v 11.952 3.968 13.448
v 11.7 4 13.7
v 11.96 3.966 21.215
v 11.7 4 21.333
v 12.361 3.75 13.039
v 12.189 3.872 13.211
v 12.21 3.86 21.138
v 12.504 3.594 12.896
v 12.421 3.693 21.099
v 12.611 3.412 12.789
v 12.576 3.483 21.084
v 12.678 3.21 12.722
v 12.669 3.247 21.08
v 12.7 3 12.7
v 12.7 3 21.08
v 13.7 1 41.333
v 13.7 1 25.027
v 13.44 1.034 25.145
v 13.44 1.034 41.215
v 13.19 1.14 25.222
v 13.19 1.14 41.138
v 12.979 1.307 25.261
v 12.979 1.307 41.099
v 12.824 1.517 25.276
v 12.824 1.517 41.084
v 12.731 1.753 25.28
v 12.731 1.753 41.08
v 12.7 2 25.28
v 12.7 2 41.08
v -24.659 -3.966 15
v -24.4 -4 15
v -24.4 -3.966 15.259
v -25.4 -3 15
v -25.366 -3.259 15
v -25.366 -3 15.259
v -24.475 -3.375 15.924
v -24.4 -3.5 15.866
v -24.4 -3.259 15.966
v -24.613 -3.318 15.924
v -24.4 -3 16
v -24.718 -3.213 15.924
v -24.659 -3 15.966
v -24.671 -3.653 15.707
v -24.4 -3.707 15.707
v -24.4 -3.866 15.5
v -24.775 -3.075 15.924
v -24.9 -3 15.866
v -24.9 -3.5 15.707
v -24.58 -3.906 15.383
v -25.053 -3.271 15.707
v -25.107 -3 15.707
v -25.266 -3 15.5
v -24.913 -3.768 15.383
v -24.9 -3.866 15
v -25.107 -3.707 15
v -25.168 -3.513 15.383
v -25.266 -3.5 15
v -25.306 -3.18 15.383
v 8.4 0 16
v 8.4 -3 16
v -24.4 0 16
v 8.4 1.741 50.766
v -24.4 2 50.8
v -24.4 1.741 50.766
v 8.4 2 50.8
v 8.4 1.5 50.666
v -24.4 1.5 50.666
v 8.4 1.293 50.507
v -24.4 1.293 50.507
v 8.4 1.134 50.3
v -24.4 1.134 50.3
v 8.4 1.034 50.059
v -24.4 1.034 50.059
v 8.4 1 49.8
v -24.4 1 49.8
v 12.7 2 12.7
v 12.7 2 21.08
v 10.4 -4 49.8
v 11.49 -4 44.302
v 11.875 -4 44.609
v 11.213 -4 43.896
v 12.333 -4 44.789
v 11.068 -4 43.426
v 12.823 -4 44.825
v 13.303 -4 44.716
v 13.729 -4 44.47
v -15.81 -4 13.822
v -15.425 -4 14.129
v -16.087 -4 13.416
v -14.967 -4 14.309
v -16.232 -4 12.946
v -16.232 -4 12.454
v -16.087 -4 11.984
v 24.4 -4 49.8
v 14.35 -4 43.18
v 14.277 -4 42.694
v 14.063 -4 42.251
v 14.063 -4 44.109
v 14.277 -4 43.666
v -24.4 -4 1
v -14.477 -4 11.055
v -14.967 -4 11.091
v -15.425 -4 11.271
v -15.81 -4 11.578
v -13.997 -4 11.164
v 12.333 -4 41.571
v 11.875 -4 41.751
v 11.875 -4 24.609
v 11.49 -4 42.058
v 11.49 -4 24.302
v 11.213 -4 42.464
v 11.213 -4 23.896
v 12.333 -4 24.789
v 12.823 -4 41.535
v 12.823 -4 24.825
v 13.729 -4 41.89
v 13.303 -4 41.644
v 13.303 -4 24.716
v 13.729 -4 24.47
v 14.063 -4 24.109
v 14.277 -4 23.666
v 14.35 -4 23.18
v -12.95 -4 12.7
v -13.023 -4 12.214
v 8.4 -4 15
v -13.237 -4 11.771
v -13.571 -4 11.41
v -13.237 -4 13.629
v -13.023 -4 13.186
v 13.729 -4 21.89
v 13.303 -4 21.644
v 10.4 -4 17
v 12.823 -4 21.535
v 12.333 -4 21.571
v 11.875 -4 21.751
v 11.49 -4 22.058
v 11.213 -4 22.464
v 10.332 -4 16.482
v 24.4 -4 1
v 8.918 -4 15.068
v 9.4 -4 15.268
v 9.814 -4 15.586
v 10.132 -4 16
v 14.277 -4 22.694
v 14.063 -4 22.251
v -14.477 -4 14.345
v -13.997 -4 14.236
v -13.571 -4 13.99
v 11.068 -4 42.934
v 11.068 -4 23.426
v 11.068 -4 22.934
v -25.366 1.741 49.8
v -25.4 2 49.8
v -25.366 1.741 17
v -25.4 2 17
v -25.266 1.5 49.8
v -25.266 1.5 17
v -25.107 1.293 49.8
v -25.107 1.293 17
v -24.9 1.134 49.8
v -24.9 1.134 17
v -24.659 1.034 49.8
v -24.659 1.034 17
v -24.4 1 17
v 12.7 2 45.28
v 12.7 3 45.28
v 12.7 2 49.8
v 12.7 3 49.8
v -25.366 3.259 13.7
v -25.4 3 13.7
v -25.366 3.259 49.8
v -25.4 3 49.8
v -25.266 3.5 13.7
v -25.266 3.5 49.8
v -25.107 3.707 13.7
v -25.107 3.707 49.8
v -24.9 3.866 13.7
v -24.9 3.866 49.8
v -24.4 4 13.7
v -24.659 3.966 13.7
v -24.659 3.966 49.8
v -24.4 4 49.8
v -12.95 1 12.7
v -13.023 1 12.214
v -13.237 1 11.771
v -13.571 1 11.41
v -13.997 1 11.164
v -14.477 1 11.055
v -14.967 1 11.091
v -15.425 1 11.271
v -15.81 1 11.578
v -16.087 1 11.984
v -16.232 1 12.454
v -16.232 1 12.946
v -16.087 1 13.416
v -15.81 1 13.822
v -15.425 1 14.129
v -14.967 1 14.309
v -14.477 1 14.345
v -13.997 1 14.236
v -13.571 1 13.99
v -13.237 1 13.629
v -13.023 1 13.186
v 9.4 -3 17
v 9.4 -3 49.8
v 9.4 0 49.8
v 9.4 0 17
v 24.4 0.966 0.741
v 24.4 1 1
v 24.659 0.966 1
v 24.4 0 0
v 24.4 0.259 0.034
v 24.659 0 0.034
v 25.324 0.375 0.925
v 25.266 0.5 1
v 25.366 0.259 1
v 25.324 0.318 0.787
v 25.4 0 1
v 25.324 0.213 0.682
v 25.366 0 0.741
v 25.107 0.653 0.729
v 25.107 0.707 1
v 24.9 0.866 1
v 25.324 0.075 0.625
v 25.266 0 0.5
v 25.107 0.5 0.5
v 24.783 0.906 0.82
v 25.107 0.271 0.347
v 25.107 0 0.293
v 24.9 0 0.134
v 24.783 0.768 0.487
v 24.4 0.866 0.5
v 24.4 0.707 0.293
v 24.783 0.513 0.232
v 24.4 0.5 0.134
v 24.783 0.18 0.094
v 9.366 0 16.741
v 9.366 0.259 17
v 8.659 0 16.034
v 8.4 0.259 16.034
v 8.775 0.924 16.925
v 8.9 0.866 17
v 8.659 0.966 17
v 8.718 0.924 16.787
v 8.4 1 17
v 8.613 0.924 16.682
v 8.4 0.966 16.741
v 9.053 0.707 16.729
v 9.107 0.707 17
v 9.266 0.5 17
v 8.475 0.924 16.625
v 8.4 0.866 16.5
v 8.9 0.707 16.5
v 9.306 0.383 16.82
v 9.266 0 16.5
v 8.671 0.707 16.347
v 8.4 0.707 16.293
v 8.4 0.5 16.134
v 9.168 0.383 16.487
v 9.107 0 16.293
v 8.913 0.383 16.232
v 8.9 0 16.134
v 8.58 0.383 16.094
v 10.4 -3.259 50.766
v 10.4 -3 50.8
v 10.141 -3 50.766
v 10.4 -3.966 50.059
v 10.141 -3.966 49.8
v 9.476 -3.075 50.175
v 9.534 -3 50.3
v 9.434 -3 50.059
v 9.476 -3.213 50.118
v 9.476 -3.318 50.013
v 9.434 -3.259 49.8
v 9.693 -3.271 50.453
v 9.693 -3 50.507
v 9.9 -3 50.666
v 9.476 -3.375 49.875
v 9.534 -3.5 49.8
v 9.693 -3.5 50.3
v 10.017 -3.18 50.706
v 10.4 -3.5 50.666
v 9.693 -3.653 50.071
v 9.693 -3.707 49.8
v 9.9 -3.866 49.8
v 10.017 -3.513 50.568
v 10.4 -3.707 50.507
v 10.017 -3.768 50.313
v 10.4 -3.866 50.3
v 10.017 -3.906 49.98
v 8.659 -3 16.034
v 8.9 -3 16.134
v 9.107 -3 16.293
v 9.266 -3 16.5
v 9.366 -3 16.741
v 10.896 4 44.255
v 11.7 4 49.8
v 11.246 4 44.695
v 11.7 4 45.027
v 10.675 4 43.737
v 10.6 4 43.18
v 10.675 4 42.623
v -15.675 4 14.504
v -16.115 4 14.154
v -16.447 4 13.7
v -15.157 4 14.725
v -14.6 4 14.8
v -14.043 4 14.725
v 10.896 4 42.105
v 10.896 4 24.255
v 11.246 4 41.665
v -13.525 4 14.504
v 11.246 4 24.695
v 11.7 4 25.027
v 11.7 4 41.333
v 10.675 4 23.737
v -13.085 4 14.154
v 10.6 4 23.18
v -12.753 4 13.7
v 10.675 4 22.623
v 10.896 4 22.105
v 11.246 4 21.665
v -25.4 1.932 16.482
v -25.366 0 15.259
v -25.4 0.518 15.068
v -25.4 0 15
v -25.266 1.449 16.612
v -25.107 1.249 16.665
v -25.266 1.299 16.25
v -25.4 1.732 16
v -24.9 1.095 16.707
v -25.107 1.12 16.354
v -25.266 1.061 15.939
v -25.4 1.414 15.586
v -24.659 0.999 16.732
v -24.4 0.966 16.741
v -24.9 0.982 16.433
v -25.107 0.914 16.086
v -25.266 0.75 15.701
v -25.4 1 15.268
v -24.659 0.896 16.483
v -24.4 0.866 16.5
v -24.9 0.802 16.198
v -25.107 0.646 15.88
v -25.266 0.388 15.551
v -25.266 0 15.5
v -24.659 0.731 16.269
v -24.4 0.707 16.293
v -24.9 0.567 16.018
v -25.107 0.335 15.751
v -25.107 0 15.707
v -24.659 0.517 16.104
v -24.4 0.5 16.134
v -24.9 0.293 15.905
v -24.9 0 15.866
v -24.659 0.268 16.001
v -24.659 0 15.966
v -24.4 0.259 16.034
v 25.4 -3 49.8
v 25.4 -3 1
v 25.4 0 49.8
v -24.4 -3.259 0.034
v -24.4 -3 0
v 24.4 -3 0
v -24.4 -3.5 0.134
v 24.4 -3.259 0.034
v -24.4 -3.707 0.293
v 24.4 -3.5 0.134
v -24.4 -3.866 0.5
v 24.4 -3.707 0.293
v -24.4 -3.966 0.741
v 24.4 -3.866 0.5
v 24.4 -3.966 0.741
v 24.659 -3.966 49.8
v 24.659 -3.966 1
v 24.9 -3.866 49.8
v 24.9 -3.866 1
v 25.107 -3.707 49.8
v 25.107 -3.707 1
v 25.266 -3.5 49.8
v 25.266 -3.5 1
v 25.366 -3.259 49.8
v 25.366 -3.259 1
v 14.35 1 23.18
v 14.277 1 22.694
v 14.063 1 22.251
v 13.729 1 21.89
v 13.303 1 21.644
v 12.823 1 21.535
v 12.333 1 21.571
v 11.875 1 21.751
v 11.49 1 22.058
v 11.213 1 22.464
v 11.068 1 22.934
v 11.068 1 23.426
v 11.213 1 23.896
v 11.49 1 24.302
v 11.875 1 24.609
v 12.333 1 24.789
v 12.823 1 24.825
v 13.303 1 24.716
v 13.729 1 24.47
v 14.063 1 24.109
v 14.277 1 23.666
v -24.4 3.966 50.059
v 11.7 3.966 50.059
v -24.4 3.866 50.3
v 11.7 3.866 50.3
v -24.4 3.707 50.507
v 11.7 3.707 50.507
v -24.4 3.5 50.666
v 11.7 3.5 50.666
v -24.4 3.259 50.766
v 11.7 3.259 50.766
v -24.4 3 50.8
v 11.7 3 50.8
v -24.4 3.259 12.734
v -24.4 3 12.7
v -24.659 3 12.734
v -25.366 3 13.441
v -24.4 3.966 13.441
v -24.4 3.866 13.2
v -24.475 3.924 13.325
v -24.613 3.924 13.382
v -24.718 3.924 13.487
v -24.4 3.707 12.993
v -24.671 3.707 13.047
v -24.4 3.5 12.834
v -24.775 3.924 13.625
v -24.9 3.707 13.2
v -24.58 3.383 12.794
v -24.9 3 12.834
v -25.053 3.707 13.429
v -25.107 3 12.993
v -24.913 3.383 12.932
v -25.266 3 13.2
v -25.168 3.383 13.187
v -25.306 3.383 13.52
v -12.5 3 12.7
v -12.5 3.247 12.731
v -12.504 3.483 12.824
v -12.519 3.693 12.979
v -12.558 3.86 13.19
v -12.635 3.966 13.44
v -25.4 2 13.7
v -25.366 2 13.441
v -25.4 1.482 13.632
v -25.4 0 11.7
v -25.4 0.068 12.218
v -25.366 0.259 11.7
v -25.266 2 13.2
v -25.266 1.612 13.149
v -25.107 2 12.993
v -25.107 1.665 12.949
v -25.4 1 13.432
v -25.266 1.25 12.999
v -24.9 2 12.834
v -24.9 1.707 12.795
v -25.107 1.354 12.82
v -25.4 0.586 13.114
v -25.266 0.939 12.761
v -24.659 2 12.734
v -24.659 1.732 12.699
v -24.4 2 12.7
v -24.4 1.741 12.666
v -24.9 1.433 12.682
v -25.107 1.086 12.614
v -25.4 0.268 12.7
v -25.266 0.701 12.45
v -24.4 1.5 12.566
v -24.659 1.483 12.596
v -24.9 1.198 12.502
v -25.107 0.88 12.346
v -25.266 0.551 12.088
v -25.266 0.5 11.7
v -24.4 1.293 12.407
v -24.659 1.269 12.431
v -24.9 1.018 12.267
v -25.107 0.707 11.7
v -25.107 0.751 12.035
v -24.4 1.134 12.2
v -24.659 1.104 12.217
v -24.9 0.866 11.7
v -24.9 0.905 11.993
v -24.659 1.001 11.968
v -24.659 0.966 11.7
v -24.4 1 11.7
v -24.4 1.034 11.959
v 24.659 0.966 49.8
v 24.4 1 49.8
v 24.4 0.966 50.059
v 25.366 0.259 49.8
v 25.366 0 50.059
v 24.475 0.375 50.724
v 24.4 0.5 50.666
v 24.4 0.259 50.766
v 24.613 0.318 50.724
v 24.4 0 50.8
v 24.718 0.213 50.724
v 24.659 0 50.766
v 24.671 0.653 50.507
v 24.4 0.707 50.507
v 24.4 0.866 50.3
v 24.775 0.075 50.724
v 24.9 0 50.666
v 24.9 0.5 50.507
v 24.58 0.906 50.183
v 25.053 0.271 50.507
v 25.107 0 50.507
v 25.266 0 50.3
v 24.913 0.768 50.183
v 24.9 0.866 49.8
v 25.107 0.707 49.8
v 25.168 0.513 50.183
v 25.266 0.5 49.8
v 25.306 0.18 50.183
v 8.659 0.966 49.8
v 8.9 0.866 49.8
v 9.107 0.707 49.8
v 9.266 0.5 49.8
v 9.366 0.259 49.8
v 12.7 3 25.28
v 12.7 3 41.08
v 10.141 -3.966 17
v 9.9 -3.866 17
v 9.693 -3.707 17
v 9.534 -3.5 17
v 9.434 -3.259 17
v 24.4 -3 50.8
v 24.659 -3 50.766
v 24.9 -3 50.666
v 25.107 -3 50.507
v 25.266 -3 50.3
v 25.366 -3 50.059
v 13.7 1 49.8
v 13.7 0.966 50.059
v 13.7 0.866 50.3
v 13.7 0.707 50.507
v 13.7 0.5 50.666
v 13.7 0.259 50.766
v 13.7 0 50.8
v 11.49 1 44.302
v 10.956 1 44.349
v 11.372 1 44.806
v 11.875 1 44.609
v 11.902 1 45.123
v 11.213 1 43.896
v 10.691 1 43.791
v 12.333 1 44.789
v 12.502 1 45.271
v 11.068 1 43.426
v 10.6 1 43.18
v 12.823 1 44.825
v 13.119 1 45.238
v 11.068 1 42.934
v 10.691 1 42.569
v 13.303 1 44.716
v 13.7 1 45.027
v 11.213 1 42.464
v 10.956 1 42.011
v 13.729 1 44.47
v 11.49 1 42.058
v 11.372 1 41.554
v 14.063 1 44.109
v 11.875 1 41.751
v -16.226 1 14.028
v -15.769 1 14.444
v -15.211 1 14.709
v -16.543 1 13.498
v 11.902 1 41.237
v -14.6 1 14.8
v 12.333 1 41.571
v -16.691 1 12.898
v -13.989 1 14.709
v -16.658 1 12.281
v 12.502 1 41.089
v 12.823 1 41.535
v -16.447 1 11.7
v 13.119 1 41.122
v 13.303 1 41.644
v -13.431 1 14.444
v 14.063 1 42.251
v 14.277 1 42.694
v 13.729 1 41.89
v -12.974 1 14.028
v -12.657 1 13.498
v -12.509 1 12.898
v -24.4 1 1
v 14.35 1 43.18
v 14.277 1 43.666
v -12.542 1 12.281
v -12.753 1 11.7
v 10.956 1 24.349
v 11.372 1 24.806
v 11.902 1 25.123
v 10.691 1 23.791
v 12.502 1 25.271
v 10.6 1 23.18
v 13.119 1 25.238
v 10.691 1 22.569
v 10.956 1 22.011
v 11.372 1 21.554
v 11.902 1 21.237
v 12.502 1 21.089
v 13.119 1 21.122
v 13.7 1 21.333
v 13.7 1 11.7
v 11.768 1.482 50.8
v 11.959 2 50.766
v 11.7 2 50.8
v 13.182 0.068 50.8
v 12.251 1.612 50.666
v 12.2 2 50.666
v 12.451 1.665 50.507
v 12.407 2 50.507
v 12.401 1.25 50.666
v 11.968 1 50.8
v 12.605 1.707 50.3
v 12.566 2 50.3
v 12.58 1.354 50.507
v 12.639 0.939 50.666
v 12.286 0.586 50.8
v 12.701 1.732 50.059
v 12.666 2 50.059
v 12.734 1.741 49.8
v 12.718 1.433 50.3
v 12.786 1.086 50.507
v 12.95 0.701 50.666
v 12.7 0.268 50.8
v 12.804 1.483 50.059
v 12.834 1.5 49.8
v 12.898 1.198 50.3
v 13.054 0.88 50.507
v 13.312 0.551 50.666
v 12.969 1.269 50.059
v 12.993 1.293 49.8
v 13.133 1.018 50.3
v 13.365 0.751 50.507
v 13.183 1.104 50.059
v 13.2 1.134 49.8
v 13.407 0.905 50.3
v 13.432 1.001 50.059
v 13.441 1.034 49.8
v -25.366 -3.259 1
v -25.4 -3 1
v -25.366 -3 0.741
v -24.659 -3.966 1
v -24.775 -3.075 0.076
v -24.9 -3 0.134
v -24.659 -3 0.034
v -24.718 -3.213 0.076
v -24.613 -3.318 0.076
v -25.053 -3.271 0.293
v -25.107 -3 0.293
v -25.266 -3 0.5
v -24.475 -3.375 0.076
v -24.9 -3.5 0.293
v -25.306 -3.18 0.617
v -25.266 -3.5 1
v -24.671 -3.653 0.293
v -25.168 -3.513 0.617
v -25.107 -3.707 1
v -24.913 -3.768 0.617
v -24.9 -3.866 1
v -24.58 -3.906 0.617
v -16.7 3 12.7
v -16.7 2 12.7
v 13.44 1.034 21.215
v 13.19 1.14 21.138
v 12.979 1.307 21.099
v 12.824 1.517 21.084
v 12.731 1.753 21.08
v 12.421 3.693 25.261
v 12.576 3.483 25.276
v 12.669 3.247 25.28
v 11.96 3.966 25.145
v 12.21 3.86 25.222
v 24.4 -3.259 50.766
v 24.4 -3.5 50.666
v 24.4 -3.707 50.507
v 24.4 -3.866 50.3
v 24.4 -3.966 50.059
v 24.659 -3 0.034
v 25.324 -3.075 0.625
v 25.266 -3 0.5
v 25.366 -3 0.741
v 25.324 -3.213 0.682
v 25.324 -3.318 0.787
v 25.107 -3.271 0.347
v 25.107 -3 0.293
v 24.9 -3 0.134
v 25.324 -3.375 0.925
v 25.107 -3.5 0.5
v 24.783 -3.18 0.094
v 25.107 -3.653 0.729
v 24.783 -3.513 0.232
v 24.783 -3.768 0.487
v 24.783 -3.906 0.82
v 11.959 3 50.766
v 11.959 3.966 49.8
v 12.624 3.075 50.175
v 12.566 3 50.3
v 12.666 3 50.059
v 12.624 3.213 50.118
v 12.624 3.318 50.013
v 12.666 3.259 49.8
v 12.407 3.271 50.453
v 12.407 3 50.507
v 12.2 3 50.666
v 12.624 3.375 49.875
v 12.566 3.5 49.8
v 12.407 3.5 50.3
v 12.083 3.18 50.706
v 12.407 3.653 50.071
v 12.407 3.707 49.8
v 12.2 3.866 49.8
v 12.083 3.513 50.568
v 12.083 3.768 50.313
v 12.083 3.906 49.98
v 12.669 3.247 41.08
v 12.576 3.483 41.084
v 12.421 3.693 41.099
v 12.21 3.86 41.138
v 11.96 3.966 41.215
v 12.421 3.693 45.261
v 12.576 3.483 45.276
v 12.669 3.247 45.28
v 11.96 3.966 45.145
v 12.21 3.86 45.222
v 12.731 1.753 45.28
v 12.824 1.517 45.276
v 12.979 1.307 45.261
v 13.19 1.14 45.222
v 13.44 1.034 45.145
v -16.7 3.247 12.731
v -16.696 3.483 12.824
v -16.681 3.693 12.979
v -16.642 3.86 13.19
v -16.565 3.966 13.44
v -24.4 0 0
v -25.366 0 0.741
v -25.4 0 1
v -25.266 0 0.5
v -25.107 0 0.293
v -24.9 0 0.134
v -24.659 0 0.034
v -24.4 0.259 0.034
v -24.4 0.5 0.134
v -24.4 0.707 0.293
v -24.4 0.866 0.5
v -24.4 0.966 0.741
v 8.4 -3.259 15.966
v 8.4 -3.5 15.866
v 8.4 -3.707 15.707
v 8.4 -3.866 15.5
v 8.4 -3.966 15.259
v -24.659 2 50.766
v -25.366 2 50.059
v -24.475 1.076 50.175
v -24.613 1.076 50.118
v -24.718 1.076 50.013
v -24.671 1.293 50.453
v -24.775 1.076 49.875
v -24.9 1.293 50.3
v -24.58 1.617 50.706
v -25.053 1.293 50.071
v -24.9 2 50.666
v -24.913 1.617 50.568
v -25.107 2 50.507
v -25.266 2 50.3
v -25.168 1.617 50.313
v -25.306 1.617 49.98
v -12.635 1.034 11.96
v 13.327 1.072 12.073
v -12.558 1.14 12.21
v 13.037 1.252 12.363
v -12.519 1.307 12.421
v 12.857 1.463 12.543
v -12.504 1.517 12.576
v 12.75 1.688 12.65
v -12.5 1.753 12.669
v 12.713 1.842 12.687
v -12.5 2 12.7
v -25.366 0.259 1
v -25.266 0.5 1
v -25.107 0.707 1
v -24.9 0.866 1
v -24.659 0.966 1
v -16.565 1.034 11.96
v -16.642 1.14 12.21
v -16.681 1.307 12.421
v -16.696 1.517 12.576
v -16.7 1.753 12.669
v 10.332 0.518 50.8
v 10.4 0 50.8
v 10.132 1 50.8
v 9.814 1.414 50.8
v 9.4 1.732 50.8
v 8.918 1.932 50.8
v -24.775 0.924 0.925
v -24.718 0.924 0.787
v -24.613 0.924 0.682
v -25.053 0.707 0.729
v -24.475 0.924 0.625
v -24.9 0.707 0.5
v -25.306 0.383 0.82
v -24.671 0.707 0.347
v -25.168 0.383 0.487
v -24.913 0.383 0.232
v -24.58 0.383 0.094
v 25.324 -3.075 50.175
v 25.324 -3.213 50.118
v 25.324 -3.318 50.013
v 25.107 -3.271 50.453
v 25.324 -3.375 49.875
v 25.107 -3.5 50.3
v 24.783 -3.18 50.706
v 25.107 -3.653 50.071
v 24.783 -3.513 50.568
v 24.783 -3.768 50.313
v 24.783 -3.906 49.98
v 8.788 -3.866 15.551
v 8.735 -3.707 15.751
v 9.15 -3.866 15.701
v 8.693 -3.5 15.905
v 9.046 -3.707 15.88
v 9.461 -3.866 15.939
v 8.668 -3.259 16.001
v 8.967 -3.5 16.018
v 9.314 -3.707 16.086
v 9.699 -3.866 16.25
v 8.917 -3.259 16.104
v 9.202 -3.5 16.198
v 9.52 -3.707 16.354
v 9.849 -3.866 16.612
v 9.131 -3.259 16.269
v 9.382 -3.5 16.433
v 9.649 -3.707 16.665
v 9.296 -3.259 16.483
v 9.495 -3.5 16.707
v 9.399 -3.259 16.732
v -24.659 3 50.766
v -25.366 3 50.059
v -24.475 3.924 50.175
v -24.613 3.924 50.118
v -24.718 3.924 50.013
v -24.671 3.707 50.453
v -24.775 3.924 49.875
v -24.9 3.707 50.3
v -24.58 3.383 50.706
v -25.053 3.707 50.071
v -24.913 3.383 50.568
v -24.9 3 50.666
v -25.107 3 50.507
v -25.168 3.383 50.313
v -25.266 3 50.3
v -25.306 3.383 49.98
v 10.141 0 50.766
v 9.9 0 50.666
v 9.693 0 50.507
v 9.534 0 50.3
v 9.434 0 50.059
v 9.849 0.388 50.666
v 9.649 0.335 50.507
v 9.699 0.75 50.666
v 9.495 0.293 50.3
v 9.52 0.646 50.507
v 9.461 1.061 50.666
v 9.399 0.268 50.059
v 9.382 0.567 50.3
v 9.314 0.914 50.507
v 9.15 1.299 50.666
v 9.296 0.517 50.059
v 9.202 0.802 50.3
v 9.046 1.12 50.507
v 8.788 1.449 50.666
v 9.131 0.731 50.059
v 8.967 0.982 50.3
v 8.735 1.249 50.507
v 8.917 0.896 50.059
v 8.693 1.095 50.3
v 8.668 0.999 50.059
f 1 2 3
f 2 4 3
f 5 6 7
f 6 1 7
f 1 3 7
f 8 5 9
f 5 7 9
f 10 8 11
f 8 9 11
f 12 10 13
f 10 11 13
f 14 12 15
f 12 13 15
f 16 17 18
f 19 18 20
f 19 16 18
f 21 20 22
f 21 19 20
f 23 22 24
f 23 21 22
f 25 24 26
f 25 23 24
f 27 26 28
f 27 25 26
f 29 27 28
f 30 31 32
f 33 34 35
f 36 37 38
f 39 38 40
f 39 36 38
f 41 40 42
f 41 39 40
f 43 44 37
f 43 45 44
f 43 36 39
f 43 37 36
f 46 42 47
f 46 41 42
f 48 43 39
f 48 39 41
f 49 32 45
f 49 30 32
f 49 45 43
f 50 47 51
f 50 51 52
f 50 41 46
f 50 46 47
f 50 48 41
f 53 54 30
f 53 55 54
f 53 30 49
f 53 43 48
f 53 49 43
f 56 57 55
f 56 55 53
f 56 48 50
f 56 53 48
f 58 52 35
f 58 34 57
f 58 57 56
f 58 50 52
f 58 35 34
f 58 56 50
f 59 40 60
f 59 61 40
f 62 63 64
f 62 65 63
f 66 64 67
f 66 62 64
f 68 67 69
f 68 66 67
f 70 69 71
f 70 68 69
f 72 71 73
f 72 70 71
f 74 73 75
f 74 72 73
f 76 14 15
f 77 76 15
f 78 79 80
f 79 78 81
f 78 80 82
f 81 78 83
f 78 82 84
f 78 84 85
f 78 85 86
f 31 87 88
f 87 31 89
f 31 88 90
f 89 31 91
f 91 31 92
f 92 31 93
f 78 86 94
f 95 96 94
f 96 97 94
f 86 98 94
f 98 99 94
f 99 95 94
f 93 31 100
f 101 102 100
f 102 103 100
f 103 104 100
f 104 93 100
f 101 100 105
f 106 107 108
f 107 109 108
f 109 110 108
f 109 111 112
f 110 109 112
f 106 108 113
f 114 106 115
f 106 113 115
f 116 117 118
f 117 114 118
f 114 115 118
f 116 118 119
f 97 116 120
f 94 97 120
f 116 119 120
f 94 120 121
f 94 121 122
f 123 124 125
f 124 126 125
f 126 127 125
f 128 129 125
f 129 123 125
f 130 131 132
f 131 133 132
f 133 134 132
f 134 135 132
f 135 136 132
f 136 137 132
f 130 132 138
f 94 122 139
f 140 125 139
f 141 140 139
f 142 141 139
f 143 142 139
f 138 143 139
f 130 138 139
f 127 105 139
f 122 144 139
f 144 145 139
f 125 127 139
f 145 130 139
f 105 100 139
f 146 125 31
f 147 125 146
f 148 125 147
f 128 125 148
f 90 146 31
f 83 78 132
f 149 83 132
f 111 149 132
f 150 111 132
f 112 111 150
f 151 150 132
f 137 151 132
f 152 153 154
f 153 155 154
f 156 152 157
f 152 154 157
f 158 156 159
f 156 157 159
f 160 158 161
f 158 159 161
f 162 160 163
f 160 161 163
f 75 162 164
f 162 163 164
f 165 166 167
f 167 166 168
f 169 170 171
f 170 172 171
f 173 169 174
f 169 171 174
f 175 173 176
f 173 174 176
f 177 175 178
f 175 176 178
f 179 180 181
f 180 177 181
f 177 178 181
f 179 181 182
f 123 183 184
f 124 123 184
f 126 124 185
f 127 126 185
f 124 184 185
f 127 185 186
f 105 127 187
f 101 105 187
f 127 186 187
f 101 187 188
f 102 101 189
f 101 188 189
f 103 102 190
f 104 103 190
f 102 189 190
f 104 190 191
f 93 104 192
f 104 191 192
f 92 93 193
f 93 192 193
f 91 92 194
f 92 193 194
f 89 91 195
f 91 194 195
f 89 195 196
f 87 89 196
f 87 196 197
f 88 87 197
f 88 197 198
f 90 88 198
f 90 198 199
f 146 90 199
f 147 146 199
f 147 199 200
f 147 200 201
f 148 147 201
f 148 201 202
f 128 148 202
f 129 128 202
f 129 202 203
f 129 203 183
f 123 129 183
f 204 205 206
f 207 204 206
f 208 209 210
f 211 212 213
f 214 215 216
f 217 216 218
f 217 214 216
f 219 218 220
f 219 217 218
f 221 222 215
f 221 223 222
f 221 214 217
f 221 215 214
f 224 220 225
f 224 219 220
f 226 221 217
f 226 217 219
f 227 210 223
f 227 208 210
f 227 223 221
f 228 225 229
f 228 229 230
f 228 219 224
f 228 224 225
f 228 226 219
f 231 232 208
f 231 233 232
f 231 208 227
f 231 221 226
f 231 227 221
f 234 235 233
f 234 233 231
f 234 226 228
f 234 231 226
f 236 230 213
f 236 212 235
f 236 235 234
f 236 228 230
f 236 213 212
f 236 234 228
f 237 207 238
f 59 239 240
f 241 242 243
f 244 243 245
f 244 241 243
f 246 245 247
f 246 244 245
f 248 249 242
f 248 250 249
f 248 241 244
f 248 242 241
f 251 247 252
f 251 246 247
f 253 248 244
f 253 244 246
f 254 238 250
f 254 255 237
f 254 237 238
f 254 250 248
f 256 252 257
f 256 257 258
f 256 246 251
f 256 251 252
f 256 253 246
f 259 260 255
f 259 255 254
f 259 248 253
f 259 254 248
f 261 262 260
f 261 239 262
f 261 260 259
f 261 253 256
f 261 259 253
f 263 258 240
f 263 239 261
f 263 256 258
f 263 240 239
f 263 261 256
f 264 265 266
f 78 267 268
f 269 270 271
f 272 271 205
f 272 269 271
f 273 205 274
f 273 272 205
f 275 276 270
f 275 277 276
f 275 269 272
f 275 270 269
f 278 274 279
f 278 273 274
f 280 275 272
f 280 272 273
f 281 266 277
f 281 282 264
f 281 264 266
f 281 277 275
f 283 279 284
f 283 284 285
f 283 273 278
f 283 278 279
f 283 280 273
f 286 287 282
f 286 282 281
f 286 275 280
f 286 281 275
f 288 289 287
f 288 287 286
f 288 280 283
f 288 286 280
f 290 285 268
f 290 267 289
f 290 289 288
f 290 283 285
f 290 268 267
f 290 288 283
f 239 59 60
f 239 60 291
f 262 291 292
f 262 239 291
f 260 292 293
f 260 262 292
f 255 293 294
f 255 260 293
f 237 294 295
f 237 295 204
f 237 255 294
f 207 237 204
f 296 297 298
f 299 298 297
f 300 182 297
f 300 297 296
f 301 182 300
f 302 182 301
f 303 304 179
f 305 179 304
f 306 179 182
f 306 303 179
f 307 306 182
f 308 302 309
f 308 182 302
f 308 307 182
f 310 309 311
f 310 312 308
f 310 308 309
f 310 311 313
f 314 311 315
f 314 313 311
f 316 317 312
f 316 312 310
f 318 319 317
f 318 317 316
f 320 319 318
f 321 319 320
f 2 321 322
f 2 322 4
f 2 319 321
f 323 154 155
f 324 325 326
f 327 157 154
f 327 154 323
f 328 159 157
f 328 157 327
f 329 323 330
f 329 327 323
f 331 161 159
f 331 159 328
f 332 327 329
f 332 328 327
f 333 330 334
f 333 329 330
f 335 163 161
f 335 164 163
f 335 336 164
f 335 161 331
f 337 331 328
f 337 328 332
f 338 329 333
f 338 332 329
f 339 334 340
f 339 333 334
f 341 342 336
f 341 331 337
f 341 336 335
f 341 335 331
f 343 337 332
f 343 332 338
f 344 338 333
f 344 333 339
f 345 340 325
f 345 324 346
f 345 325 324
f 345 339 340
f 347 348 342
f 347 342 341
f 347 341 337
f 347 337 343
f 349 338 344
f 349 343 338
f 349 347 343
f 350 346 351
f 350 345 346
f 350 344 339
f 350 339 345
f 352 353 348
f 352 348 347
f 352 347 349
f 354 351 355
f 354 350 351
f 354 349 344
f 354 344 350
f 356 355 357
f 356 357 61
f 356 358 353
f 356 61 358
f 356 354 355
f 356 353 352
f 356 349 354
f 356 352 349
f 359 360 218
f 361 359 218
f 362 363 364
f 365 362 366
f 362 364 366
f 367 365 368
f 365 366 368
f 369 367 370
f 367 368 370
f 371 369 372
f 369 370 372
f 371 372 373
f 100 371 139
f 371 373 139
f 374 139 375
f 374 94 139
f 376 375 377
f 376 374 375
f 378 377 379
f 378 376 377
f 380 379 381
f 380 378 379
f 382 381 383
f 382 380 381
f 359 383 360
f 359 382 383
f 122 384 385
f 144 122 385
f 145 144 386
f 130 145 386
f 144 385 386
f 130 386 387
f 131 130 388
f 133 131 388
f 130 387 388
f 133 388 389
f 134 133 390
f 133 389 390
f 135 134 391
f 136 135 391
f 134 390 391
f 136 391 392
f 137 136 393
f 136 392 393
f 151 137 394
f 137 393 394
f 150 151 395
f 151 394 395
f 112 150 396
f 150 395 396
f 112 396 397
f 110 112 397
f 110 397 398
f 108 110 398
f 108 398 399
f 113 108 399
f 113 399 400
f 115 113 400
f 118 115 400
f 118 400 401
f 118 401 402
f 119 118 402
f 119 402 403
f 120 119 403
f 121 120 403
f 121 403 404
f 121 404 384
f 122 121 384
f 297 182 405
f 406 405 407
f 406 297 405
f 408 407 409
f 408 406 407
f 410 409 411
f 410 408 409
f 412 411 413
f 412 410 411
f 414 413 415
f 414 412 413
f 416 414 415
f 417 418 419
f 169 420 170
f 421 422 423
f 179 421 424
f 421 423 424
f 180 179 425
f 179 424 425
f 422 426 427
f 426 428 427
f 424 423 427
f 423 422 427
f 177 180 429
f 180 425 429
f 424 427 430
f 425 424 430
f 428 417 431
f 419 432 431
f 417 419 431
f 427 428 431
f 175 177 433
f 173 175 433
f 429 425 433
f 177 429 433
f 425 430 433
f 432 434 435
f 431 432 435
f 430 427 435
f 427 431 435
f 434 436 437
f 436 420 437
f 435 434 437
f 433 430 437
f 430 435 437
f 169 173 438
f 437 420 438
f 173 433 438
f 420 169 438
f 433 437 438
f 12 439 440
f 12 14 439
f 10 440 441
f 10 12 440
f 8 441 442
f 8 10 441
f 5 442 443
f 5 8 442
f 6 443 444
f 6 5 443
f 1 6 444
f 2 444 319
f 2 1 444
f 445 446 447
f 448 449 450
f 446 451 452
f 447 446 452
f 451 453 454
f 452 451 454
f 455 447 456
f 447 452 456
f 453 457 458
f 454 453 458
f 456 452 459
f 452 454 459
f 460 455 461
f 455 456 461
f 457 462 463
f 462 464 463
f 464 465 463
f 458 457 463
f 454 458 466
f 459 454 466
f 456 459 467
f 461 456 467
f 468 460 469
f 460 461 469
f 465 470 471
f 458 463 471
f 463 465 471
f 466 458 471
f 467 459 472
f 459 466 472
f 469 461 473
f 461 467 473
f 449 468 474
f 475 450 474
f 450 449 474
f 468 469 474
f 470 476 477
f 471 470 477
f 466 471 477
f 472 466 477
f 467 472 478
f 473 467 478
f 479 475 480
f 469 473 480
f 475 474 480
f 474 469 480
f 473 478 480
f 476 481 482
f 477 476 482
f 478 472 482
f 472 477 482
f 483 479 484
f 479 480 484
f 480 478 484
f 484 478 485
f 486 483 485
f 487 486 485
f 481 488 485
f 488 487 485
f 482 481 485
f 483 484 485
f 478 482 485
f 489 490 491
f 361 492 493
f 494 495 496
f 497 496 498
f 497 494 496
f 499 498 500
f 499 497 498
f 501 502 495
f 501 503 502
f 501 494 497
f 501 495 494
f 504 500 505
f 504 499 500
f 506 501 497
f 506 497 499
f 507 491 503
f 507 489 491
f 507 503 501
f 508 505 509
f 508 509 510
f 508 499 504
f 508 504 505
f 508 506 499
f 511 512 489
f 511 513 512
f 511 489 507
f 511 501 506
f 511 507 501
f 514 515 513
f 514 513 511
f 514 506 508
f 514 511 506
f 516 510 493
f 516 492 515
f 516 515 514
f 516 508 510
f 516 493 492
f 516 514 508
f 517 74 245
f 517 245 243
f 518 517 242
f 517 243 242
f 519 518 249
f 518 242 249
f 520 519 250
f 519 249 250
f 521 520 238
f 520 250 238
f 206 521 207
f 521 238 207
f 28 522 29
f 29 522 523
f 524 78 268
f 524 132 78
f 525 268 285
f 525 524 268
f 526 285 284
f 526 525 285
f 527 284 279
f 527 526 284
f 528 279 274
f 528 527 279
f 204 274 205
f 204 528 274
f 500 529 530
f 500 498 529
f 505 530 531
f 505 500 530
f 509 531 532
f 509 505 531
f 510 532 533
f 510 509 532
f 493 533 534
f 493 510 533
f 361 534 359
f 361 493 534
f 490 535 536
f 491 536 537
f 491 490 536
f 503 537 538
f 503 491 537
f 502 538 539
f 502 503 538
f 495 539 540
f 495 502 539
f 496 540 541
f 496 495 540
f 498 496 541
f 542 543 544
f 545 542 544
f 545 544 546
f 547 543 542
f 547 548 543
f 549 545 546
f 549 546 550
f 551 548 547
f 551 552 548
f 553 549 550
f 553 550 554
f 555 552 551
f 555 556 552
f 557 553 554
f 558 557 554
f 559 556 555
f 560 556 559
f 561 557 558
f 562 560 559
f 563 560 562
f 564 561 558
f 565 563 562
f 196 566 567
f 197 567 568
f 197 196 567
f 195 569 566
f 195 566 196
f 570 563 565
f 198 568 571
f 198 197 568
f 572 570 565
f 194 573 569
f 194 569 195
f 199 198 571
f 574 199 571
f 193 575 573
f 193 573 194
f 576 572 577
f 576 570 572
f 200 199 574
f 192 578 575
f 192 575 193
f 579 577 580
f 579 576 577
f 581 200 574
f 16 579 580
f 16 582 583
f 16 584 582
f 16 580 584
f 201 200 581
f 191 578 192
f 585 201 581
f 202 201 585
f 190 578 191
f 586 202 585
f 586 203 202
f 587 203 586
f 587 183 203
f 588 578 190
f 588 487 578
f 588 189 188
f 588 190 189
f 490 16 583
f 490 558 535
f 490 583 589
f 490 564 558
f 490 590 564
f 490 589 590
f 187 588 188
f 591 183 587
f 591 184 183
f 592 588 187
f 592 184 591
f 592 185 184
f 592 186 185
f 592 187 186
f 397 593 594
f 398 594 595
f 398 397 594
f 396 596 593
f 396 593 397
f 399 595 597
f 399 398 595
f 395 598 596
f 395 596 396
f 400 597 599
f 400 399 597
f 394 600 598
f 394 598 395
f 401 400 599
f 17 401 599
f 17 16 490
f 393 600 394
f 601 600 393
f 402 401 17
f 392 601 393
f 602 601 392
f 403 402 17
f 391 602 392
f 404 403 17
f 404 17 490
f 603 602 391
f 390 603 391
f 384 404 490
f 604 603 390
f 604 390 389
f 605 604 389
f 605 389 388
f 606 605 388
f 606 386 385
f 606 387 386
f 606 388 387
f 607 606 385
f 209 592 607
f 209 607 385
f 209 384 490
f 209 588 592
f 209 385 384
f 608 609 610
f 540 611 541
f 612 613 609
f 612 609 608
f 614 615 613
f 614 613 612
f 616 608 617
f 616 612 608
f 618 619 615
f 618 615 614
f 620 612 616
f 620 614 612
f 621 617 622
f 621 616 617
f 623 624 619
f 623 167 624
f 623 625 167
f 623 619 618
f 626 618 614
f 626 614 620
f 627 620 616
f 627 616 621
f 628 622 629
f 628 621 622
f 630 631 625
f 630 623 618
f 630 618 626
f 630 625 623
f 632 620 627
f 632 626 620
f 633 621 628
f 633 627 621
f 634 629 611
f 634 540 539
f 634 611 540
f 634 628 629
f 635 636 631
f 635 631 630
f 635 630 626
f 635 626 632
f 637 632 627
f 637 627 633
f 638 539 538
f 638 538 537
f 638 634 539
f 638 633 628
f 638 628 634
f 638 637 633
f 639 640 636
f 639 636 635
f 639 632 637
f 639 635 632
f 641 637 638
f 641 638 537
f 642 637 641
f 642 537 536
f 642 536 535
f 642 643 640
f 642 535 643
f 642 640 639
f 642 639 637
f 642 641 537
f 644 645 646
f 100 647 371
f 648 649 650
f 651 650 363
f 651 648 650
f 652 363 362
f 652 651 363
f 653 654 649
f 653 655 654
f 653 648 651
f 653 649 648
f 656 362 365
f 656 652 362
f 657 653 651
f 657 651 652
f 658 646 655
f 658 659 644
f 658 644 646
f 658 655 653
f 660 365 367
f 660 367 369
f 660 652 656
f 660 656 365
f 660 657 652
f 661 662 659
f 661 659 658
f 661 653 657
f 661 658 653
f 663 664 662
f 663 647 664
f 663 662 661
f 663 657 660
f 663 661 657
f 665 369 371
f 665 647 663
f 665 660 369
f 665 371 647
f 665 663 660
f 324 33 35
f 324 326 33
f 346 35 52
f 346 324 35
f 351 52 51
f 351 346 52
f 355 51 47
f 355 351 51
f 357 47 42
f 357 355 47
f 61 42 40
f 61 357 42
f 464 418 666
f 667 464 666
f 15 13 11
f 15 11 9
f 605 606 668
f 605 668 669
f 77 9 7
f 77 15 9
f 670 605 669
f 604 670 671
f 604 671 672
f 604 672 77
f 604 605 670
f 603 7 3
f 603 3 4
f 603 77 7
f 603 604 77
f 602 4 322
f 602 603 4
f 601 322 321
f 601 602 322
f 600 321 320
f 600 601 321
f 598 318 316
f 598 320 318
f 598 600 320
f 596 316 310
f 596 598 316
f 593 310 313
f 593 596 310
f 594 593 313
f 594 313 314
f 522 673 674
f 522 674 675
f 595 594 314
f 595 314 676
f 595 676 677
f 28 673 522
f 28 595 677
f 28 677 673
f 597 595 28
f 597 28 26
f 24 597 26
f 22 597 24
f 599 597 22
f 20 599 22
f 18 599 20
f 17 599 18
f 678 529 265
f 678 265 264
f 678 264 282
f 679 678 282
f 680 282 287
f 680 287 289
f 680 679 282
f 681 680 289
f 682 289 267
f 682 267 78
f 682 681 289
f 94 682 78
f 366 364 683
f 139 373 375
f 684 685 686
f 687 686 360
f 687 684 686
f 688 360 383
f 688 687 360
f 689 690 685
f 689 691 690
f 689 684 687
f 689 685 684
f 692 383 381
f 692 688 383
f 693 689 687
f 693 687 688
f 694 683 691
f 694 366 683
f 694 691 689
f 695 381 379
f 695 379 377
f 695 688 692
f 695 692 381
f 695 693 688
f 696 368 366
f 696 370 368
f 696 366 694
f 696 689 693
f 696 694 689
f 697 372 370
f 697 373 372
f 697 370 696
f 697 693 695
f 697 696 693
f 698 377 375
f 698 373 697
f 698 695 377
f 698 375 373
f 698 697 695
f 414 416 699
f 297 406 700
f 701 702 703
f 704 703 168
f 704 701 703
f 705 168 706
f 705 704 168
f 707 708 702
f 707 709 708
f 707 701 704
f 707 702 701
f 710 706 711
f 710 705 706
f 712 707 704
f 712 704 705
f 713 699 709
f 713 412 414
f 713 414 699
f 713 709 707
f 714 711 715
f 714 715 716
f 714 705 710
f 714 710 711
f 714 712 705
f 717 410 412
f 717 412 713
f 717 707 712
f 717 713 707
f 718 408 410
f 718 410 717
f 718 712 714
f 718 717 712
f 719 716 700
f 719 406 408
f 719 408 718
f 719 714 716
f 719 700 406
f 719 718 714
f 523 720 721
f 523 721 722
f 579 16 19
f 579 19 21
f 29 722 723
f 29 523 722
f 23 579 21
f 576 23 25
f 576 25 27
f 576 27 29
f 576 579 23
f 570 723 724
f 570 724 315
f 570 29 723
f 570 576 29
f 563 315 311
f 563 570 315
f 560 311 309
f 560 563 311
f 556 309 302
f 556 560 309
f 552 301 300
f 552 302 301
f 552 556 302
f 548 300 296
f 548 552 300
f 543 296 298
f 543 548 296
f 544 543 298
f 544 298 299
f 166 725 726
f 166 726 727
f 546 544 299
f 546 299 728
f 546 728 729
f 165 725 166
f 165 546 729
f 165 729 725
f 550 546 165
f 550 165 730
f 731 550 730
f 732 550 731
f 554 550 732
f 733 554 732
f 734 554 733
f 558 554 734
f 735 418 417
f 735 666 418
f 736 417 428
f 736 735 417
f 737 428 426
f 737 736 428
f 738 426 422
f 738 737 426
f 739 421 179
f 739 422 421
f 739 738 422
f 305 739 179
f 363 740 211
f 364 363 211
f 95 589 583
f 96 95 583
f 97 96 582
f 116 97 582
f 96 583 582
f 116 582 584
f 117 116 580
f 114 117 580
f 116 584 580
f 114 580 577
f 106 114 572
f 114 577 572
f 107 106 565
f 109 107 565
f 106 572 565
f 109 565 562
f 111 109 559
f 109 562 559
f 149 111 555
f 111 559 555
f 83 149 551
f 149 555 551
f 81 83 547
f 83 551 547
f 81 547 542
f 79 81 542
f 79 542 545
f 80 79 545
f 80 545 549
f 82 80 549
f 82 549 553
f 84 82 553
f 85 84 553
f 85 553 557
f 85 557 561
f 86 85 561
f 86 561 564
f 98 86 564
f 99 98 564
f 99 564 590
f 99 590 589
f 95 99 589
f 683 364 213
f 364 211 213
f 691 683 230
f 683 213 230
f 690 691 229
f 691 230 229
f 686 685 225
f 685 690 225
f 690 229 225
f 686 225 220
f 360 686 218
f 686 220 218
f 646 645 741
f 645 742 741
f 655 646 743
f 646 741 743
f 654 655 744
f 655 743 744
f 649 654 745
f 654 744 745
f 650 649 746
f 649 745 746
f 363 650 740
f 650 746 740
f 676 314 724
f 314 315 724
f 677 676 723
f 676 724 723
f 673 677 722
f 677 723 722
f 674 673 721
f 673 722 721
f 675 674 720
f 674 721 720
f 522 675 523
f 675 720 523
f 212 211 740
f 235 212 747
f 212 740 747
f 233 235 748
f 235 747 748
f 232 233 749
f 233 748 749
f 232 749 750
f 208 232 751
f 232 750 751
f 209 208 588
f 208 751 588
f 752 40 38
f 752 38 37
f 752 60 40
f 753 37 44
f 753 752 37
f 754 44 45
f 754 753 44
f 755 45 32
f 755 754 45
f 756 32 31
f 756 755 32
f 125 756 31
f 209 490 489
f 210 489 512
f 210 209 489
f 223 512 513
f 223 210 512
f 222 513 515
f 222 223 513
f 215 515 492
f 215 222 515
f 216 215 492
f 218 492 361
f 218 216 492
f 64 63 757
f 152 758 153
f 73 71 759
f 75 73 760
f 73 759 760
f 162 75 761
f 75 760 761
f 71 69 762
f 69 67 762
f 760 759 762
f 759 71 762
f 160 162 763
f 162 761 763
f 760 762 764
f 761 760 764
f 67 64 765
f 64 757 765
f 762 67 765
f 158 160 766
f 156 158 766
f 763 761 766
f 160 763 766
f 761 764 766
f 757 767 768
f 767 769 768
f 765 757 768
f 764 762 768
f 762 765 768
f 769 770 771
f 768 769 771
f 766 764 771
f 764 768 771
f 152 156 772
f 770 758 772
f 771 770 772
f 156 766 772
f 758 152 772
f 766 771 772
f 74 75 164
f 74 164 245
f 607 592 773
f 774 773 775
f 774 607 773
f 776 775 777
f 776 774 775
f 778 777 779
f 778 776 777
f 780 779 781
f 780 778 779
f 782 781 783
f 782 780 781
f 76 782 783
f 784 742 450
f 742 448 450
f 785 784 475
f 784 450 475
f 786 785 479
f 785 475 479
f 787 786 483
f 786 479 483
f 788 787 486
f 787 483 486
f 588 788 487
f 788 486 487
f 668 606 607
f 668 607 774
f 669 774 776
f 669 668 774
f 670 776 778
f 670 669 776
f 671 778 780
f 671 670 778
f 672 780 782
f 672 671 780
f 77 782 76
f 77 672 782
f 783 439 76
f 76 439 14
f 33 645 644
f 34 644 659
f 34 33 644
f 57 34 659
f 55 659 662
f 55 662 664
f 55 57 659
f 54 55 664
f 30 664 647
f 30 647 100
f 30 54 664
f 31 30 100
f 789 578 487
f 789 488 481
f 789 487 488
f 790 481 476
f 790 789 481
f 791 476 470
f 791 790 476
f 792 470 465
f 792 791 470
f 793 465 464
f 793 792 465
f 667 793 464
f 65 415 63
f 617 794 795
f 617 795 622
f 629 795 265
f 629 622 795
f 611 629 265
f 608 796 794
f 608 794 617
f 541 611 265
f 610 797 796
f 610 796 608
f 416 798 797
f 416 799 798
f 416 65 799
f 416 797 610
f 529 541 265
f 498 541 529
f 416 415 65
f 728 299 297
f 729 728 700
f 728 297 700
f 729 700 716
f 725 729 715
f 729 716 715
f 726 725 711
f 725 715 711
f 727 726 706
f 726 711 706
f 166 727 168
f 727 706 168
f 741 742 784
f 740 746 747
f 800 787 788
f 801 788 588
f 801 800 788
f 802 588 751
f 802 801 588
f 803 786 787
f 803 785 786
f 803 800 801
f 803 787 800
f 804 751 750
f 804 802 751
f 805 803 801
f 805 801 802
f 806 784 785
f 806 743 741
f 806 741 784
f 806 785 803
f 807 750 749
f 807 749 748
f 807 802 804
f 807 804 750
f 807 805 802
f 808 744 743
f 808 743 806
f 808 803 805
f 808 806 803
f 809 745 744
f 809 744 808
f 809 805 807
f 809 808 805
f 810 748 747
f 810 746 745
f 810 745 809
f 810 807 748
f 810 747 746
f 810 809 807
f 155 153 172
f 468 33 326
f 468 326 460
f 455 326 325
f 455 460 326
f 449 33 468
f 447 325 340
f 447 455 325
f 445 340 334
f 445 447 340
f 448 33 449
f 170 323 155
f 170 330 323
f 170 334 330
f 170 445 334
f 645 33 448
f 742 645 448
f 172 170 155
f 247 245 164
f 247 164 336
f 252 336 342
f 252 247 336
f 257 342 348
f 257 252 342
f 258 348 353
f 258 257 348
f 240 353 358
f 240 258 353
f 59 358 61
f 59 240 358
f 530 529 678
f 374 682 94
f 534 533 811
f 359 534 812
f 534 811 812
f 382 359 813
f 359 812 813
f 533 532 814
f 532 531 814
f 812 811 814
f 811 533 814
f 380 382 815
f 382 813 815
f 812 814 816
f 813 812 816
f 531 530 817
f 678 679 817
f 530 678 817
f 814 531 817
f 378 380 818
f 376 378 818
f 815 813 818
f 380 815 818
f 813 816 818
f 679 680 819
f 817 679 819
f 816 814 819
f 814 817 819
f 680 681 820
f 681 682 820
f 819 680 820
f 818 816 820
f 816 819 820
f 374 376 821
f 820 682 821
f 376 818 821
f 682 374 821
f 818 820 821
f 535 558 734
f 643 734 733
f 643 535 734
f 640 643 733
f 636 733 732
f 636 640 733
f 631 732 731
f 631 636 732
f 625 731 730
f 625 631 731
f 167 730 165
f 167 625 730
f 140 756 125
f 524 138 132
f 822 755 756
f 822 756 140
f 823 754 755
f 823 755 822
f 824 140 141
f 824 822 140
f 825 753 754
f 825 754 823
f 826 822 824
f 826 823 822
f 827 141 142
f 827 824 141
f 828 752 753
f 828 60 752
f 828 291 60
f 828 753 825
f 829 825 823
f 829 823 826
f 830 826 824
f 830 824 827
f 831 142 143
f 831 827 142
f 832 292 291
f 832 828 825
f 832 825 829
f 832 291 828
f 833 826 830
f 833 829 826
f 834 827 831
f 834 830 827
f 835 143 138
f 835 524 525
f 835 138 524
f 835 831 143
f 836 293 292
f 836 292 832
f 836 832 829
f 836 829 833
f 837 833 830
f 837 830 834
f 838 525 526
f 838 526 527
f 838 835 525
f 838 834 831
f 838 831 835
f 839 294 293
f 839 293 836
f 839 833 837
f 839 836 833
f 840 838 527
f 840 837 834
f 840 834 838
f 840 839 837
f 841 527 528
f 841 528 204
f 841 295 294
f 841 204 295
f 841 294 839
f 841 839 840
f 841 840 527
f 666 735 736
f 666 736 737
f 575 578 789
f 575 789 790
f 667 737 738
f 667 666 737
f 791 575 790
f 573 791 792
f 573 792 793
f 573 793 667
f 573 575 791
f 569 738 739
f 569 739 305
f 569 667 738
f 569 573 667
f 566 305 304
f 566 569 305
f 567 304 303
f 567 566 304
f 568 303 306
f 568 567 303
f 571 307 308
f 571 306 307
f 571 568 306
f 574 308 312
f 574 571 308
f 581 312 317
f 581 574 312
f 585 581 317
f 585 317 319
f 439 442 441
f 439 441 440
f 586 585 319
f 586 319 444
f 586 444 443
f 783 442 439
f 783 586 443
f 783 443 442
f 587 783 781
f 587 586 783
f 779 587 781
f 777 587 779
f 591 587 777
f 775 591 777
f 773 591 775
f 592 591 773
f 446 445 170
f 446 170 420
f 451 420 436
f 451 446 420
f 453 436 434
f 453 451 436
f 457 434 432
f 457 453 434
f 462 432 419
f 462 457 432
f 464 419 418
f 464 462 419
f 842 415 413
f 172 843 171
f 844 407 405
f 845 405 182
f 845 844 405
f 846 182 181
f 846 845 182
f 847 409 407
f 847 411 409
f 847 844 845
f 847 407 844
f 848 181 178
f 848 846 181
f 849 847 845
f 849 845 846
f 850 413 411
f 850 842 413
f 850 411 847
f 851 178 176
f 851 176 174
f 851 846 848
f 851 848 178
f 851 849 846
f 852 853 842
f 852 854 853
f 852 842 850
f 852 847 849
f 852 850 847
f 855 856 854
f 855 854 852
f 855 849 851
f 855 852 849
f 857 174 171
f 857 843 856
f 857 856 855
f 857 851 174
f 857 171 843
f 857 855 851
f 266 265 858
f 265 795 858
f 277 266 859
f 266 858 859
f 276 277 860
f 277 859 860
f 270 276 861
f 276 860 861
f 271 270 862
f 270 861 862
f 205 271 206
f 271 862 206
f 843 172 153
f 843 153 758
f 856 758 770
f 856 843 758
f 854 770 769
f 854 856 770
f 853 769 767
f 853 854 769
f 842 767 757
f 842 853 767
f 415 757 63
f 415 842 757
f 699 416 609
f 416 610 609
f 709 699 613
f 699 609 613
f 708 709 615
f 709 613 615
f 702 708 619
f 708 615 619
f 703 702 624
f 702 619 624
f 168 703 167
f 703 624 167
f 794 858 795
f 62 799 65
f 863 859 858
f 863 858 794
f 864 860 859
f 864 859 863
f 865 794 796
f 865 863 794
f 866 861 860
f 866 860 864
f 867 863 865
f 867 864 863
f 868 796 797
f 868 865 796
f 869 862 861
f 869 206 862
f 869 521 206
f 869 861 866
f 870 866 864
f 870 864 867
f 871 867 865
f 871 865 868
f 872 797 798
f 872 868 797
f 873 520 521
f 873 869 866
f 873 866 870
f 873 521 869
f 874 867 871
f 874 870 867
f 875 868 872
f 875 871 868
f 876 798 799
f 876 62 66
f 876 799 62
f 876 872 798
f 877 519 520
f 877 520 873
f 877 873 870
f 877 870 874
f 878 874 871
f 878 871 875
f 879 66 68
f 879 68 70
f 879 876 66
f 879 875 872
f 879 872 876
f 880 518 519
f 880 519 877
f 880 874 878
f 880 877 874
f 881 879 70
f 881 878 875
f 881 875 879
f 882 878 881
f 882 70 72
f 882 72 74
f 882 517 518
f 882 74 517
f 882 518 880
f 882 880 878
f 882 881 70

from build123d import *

# Parameters (mm, degrees)
SKETCH1_W           = 50.8
SKETCH1_H           = 8
BOSS_EXTRUDE1_DEPTH = 50.8
SKETCH2_W           = 34.8
SKETCH2_H           = 5
CUT_EXTRUDE2_DEPTH  = 34.8
CUT_EXTRUDE3_DEPTH  = 3
FILLET1_R           = 1
SKETCH4_R           = 2.1
CUT_EXTRUDE4_DEPTH  = 4
SKETCH5_R           = 1.65
CUT_EXTRUDE5_DEPTH  = 6


with BuildPart() as part:
    # Sketch1 → Boss-Extrude1 (new body)
    with BuildSketch(Plane.XY):
        Rectangle(SKETCH1_W, SKETCH1_H)
    extrude(amount=BOSS_EXTRUDE1_DEPTH)

    # Sketch2 → Cut-Extrude2 (cut)
    with BuildSketch(Plane.XY.offset(50.8)):
        with Locations((-8, -1.5)):
            Rectangle(SKETCH2_W, SKETCH2_H)
    extrude(amount=-CUT_EXTRUDE2_DEPTH, mode=Mode.SUBTRACT)

    # Sketch3 → Cut-Extrude3 (cut)
    with BuildSketch(Plane(origin=(0, 4, 0), x_dir=(1, 0, 0), z_dir=(0, 1, 0))):
        Polygon((-25.4, -12.7), (12.7, -12.7), (12.7, -50.8), (25.4, -50.8), (25.4, 0), (-25.4, 0), align=None)
    extrude(amount=-CUT_EXTRUDE3_DEPTH, mode=Mode.SUBTRACT)

    # Fillet1
    fillet1_edges = [part.edges().sort_by_distance(p)[0] for p in [
        (-25.4, 2.5, 50.8),
        (17.4, -4, 50.8),
        (-25.4, -4, 8),
        (9.4, -1.5, 50.8),
        (-8, 1, 50.8),
        (-8, -4, 16),
        (9.4, -4, 33.4),
        (9.4, -1.5, 16),
        (9.4, 1, 33.4),
        (-8, 1, 16),
        (-25.4, 1, 33.4),
        (-25.4, -1.5, 16),
        (-25.4, -1.5, 0),
        (-6.35, 4, 50.8),
        (-25.4, 2.5, 12.7),
        (12.7, 2.5, 50.8),
        (-6.35, 4, 12.7),
        (12.7, 4, 31.75),
        (-25.4, 1, 6.35),
        (0, 1, 0),
        (25.4, 1, 25.4),
        (19.05, 1, 50.8),
        (12.7, 1, 31.75),
        (-6.35, 1, 12.7),
        (25.4, -1.5, 50.8),
        (0, -4, 0),
        (25.4, -1.5, 0),
        (25.4, -4, 25.4),
        (-25.4, 4, 31.75),
    ]]
    fillet(fillet1_edges, radius=FILLET1_R)

    # Sketch4 → Cut-Extrude4 (cut, through all)
    with BuildSketch(Plane(origin=(0, 1, 0), x_dir=(1, 0, 0), z_dir=(0, 1, 0))):
        with Locations((-14.6, -12.7)):
            Circle(SKETCH4_R)
        with Locations((12.7, -43.18)):
            Circle(SKETCH4_R)
        with Locations((12.7, -23.18)):
            Circle(SKETCH4_R)
    extrude(amount=CUT_EXTRUDE4_DEPTH, mode=Mode.SUBTRACT)

    # Sketch5 → Cut-Extrude5 (cut, through all)
    with BuildSketch(Plane(origin=(0, 1, 0), x_dir=(1, 0, 0), z_dir=(0, 1, 0))):
        with Locations((-14.6, -12.7)):
            Circle(SKETCH5_R)
        with Locations((12.7, -23.18)):
            Circle(SKETCH5_R)
        with Locations((12.7, -43.18)):
            Circle(SKETCH5_R)
    extrude(amount=-CUT_EXTRUDE5_DEPTH, mode=Mode.SUBTRACT)


solid = part.part
